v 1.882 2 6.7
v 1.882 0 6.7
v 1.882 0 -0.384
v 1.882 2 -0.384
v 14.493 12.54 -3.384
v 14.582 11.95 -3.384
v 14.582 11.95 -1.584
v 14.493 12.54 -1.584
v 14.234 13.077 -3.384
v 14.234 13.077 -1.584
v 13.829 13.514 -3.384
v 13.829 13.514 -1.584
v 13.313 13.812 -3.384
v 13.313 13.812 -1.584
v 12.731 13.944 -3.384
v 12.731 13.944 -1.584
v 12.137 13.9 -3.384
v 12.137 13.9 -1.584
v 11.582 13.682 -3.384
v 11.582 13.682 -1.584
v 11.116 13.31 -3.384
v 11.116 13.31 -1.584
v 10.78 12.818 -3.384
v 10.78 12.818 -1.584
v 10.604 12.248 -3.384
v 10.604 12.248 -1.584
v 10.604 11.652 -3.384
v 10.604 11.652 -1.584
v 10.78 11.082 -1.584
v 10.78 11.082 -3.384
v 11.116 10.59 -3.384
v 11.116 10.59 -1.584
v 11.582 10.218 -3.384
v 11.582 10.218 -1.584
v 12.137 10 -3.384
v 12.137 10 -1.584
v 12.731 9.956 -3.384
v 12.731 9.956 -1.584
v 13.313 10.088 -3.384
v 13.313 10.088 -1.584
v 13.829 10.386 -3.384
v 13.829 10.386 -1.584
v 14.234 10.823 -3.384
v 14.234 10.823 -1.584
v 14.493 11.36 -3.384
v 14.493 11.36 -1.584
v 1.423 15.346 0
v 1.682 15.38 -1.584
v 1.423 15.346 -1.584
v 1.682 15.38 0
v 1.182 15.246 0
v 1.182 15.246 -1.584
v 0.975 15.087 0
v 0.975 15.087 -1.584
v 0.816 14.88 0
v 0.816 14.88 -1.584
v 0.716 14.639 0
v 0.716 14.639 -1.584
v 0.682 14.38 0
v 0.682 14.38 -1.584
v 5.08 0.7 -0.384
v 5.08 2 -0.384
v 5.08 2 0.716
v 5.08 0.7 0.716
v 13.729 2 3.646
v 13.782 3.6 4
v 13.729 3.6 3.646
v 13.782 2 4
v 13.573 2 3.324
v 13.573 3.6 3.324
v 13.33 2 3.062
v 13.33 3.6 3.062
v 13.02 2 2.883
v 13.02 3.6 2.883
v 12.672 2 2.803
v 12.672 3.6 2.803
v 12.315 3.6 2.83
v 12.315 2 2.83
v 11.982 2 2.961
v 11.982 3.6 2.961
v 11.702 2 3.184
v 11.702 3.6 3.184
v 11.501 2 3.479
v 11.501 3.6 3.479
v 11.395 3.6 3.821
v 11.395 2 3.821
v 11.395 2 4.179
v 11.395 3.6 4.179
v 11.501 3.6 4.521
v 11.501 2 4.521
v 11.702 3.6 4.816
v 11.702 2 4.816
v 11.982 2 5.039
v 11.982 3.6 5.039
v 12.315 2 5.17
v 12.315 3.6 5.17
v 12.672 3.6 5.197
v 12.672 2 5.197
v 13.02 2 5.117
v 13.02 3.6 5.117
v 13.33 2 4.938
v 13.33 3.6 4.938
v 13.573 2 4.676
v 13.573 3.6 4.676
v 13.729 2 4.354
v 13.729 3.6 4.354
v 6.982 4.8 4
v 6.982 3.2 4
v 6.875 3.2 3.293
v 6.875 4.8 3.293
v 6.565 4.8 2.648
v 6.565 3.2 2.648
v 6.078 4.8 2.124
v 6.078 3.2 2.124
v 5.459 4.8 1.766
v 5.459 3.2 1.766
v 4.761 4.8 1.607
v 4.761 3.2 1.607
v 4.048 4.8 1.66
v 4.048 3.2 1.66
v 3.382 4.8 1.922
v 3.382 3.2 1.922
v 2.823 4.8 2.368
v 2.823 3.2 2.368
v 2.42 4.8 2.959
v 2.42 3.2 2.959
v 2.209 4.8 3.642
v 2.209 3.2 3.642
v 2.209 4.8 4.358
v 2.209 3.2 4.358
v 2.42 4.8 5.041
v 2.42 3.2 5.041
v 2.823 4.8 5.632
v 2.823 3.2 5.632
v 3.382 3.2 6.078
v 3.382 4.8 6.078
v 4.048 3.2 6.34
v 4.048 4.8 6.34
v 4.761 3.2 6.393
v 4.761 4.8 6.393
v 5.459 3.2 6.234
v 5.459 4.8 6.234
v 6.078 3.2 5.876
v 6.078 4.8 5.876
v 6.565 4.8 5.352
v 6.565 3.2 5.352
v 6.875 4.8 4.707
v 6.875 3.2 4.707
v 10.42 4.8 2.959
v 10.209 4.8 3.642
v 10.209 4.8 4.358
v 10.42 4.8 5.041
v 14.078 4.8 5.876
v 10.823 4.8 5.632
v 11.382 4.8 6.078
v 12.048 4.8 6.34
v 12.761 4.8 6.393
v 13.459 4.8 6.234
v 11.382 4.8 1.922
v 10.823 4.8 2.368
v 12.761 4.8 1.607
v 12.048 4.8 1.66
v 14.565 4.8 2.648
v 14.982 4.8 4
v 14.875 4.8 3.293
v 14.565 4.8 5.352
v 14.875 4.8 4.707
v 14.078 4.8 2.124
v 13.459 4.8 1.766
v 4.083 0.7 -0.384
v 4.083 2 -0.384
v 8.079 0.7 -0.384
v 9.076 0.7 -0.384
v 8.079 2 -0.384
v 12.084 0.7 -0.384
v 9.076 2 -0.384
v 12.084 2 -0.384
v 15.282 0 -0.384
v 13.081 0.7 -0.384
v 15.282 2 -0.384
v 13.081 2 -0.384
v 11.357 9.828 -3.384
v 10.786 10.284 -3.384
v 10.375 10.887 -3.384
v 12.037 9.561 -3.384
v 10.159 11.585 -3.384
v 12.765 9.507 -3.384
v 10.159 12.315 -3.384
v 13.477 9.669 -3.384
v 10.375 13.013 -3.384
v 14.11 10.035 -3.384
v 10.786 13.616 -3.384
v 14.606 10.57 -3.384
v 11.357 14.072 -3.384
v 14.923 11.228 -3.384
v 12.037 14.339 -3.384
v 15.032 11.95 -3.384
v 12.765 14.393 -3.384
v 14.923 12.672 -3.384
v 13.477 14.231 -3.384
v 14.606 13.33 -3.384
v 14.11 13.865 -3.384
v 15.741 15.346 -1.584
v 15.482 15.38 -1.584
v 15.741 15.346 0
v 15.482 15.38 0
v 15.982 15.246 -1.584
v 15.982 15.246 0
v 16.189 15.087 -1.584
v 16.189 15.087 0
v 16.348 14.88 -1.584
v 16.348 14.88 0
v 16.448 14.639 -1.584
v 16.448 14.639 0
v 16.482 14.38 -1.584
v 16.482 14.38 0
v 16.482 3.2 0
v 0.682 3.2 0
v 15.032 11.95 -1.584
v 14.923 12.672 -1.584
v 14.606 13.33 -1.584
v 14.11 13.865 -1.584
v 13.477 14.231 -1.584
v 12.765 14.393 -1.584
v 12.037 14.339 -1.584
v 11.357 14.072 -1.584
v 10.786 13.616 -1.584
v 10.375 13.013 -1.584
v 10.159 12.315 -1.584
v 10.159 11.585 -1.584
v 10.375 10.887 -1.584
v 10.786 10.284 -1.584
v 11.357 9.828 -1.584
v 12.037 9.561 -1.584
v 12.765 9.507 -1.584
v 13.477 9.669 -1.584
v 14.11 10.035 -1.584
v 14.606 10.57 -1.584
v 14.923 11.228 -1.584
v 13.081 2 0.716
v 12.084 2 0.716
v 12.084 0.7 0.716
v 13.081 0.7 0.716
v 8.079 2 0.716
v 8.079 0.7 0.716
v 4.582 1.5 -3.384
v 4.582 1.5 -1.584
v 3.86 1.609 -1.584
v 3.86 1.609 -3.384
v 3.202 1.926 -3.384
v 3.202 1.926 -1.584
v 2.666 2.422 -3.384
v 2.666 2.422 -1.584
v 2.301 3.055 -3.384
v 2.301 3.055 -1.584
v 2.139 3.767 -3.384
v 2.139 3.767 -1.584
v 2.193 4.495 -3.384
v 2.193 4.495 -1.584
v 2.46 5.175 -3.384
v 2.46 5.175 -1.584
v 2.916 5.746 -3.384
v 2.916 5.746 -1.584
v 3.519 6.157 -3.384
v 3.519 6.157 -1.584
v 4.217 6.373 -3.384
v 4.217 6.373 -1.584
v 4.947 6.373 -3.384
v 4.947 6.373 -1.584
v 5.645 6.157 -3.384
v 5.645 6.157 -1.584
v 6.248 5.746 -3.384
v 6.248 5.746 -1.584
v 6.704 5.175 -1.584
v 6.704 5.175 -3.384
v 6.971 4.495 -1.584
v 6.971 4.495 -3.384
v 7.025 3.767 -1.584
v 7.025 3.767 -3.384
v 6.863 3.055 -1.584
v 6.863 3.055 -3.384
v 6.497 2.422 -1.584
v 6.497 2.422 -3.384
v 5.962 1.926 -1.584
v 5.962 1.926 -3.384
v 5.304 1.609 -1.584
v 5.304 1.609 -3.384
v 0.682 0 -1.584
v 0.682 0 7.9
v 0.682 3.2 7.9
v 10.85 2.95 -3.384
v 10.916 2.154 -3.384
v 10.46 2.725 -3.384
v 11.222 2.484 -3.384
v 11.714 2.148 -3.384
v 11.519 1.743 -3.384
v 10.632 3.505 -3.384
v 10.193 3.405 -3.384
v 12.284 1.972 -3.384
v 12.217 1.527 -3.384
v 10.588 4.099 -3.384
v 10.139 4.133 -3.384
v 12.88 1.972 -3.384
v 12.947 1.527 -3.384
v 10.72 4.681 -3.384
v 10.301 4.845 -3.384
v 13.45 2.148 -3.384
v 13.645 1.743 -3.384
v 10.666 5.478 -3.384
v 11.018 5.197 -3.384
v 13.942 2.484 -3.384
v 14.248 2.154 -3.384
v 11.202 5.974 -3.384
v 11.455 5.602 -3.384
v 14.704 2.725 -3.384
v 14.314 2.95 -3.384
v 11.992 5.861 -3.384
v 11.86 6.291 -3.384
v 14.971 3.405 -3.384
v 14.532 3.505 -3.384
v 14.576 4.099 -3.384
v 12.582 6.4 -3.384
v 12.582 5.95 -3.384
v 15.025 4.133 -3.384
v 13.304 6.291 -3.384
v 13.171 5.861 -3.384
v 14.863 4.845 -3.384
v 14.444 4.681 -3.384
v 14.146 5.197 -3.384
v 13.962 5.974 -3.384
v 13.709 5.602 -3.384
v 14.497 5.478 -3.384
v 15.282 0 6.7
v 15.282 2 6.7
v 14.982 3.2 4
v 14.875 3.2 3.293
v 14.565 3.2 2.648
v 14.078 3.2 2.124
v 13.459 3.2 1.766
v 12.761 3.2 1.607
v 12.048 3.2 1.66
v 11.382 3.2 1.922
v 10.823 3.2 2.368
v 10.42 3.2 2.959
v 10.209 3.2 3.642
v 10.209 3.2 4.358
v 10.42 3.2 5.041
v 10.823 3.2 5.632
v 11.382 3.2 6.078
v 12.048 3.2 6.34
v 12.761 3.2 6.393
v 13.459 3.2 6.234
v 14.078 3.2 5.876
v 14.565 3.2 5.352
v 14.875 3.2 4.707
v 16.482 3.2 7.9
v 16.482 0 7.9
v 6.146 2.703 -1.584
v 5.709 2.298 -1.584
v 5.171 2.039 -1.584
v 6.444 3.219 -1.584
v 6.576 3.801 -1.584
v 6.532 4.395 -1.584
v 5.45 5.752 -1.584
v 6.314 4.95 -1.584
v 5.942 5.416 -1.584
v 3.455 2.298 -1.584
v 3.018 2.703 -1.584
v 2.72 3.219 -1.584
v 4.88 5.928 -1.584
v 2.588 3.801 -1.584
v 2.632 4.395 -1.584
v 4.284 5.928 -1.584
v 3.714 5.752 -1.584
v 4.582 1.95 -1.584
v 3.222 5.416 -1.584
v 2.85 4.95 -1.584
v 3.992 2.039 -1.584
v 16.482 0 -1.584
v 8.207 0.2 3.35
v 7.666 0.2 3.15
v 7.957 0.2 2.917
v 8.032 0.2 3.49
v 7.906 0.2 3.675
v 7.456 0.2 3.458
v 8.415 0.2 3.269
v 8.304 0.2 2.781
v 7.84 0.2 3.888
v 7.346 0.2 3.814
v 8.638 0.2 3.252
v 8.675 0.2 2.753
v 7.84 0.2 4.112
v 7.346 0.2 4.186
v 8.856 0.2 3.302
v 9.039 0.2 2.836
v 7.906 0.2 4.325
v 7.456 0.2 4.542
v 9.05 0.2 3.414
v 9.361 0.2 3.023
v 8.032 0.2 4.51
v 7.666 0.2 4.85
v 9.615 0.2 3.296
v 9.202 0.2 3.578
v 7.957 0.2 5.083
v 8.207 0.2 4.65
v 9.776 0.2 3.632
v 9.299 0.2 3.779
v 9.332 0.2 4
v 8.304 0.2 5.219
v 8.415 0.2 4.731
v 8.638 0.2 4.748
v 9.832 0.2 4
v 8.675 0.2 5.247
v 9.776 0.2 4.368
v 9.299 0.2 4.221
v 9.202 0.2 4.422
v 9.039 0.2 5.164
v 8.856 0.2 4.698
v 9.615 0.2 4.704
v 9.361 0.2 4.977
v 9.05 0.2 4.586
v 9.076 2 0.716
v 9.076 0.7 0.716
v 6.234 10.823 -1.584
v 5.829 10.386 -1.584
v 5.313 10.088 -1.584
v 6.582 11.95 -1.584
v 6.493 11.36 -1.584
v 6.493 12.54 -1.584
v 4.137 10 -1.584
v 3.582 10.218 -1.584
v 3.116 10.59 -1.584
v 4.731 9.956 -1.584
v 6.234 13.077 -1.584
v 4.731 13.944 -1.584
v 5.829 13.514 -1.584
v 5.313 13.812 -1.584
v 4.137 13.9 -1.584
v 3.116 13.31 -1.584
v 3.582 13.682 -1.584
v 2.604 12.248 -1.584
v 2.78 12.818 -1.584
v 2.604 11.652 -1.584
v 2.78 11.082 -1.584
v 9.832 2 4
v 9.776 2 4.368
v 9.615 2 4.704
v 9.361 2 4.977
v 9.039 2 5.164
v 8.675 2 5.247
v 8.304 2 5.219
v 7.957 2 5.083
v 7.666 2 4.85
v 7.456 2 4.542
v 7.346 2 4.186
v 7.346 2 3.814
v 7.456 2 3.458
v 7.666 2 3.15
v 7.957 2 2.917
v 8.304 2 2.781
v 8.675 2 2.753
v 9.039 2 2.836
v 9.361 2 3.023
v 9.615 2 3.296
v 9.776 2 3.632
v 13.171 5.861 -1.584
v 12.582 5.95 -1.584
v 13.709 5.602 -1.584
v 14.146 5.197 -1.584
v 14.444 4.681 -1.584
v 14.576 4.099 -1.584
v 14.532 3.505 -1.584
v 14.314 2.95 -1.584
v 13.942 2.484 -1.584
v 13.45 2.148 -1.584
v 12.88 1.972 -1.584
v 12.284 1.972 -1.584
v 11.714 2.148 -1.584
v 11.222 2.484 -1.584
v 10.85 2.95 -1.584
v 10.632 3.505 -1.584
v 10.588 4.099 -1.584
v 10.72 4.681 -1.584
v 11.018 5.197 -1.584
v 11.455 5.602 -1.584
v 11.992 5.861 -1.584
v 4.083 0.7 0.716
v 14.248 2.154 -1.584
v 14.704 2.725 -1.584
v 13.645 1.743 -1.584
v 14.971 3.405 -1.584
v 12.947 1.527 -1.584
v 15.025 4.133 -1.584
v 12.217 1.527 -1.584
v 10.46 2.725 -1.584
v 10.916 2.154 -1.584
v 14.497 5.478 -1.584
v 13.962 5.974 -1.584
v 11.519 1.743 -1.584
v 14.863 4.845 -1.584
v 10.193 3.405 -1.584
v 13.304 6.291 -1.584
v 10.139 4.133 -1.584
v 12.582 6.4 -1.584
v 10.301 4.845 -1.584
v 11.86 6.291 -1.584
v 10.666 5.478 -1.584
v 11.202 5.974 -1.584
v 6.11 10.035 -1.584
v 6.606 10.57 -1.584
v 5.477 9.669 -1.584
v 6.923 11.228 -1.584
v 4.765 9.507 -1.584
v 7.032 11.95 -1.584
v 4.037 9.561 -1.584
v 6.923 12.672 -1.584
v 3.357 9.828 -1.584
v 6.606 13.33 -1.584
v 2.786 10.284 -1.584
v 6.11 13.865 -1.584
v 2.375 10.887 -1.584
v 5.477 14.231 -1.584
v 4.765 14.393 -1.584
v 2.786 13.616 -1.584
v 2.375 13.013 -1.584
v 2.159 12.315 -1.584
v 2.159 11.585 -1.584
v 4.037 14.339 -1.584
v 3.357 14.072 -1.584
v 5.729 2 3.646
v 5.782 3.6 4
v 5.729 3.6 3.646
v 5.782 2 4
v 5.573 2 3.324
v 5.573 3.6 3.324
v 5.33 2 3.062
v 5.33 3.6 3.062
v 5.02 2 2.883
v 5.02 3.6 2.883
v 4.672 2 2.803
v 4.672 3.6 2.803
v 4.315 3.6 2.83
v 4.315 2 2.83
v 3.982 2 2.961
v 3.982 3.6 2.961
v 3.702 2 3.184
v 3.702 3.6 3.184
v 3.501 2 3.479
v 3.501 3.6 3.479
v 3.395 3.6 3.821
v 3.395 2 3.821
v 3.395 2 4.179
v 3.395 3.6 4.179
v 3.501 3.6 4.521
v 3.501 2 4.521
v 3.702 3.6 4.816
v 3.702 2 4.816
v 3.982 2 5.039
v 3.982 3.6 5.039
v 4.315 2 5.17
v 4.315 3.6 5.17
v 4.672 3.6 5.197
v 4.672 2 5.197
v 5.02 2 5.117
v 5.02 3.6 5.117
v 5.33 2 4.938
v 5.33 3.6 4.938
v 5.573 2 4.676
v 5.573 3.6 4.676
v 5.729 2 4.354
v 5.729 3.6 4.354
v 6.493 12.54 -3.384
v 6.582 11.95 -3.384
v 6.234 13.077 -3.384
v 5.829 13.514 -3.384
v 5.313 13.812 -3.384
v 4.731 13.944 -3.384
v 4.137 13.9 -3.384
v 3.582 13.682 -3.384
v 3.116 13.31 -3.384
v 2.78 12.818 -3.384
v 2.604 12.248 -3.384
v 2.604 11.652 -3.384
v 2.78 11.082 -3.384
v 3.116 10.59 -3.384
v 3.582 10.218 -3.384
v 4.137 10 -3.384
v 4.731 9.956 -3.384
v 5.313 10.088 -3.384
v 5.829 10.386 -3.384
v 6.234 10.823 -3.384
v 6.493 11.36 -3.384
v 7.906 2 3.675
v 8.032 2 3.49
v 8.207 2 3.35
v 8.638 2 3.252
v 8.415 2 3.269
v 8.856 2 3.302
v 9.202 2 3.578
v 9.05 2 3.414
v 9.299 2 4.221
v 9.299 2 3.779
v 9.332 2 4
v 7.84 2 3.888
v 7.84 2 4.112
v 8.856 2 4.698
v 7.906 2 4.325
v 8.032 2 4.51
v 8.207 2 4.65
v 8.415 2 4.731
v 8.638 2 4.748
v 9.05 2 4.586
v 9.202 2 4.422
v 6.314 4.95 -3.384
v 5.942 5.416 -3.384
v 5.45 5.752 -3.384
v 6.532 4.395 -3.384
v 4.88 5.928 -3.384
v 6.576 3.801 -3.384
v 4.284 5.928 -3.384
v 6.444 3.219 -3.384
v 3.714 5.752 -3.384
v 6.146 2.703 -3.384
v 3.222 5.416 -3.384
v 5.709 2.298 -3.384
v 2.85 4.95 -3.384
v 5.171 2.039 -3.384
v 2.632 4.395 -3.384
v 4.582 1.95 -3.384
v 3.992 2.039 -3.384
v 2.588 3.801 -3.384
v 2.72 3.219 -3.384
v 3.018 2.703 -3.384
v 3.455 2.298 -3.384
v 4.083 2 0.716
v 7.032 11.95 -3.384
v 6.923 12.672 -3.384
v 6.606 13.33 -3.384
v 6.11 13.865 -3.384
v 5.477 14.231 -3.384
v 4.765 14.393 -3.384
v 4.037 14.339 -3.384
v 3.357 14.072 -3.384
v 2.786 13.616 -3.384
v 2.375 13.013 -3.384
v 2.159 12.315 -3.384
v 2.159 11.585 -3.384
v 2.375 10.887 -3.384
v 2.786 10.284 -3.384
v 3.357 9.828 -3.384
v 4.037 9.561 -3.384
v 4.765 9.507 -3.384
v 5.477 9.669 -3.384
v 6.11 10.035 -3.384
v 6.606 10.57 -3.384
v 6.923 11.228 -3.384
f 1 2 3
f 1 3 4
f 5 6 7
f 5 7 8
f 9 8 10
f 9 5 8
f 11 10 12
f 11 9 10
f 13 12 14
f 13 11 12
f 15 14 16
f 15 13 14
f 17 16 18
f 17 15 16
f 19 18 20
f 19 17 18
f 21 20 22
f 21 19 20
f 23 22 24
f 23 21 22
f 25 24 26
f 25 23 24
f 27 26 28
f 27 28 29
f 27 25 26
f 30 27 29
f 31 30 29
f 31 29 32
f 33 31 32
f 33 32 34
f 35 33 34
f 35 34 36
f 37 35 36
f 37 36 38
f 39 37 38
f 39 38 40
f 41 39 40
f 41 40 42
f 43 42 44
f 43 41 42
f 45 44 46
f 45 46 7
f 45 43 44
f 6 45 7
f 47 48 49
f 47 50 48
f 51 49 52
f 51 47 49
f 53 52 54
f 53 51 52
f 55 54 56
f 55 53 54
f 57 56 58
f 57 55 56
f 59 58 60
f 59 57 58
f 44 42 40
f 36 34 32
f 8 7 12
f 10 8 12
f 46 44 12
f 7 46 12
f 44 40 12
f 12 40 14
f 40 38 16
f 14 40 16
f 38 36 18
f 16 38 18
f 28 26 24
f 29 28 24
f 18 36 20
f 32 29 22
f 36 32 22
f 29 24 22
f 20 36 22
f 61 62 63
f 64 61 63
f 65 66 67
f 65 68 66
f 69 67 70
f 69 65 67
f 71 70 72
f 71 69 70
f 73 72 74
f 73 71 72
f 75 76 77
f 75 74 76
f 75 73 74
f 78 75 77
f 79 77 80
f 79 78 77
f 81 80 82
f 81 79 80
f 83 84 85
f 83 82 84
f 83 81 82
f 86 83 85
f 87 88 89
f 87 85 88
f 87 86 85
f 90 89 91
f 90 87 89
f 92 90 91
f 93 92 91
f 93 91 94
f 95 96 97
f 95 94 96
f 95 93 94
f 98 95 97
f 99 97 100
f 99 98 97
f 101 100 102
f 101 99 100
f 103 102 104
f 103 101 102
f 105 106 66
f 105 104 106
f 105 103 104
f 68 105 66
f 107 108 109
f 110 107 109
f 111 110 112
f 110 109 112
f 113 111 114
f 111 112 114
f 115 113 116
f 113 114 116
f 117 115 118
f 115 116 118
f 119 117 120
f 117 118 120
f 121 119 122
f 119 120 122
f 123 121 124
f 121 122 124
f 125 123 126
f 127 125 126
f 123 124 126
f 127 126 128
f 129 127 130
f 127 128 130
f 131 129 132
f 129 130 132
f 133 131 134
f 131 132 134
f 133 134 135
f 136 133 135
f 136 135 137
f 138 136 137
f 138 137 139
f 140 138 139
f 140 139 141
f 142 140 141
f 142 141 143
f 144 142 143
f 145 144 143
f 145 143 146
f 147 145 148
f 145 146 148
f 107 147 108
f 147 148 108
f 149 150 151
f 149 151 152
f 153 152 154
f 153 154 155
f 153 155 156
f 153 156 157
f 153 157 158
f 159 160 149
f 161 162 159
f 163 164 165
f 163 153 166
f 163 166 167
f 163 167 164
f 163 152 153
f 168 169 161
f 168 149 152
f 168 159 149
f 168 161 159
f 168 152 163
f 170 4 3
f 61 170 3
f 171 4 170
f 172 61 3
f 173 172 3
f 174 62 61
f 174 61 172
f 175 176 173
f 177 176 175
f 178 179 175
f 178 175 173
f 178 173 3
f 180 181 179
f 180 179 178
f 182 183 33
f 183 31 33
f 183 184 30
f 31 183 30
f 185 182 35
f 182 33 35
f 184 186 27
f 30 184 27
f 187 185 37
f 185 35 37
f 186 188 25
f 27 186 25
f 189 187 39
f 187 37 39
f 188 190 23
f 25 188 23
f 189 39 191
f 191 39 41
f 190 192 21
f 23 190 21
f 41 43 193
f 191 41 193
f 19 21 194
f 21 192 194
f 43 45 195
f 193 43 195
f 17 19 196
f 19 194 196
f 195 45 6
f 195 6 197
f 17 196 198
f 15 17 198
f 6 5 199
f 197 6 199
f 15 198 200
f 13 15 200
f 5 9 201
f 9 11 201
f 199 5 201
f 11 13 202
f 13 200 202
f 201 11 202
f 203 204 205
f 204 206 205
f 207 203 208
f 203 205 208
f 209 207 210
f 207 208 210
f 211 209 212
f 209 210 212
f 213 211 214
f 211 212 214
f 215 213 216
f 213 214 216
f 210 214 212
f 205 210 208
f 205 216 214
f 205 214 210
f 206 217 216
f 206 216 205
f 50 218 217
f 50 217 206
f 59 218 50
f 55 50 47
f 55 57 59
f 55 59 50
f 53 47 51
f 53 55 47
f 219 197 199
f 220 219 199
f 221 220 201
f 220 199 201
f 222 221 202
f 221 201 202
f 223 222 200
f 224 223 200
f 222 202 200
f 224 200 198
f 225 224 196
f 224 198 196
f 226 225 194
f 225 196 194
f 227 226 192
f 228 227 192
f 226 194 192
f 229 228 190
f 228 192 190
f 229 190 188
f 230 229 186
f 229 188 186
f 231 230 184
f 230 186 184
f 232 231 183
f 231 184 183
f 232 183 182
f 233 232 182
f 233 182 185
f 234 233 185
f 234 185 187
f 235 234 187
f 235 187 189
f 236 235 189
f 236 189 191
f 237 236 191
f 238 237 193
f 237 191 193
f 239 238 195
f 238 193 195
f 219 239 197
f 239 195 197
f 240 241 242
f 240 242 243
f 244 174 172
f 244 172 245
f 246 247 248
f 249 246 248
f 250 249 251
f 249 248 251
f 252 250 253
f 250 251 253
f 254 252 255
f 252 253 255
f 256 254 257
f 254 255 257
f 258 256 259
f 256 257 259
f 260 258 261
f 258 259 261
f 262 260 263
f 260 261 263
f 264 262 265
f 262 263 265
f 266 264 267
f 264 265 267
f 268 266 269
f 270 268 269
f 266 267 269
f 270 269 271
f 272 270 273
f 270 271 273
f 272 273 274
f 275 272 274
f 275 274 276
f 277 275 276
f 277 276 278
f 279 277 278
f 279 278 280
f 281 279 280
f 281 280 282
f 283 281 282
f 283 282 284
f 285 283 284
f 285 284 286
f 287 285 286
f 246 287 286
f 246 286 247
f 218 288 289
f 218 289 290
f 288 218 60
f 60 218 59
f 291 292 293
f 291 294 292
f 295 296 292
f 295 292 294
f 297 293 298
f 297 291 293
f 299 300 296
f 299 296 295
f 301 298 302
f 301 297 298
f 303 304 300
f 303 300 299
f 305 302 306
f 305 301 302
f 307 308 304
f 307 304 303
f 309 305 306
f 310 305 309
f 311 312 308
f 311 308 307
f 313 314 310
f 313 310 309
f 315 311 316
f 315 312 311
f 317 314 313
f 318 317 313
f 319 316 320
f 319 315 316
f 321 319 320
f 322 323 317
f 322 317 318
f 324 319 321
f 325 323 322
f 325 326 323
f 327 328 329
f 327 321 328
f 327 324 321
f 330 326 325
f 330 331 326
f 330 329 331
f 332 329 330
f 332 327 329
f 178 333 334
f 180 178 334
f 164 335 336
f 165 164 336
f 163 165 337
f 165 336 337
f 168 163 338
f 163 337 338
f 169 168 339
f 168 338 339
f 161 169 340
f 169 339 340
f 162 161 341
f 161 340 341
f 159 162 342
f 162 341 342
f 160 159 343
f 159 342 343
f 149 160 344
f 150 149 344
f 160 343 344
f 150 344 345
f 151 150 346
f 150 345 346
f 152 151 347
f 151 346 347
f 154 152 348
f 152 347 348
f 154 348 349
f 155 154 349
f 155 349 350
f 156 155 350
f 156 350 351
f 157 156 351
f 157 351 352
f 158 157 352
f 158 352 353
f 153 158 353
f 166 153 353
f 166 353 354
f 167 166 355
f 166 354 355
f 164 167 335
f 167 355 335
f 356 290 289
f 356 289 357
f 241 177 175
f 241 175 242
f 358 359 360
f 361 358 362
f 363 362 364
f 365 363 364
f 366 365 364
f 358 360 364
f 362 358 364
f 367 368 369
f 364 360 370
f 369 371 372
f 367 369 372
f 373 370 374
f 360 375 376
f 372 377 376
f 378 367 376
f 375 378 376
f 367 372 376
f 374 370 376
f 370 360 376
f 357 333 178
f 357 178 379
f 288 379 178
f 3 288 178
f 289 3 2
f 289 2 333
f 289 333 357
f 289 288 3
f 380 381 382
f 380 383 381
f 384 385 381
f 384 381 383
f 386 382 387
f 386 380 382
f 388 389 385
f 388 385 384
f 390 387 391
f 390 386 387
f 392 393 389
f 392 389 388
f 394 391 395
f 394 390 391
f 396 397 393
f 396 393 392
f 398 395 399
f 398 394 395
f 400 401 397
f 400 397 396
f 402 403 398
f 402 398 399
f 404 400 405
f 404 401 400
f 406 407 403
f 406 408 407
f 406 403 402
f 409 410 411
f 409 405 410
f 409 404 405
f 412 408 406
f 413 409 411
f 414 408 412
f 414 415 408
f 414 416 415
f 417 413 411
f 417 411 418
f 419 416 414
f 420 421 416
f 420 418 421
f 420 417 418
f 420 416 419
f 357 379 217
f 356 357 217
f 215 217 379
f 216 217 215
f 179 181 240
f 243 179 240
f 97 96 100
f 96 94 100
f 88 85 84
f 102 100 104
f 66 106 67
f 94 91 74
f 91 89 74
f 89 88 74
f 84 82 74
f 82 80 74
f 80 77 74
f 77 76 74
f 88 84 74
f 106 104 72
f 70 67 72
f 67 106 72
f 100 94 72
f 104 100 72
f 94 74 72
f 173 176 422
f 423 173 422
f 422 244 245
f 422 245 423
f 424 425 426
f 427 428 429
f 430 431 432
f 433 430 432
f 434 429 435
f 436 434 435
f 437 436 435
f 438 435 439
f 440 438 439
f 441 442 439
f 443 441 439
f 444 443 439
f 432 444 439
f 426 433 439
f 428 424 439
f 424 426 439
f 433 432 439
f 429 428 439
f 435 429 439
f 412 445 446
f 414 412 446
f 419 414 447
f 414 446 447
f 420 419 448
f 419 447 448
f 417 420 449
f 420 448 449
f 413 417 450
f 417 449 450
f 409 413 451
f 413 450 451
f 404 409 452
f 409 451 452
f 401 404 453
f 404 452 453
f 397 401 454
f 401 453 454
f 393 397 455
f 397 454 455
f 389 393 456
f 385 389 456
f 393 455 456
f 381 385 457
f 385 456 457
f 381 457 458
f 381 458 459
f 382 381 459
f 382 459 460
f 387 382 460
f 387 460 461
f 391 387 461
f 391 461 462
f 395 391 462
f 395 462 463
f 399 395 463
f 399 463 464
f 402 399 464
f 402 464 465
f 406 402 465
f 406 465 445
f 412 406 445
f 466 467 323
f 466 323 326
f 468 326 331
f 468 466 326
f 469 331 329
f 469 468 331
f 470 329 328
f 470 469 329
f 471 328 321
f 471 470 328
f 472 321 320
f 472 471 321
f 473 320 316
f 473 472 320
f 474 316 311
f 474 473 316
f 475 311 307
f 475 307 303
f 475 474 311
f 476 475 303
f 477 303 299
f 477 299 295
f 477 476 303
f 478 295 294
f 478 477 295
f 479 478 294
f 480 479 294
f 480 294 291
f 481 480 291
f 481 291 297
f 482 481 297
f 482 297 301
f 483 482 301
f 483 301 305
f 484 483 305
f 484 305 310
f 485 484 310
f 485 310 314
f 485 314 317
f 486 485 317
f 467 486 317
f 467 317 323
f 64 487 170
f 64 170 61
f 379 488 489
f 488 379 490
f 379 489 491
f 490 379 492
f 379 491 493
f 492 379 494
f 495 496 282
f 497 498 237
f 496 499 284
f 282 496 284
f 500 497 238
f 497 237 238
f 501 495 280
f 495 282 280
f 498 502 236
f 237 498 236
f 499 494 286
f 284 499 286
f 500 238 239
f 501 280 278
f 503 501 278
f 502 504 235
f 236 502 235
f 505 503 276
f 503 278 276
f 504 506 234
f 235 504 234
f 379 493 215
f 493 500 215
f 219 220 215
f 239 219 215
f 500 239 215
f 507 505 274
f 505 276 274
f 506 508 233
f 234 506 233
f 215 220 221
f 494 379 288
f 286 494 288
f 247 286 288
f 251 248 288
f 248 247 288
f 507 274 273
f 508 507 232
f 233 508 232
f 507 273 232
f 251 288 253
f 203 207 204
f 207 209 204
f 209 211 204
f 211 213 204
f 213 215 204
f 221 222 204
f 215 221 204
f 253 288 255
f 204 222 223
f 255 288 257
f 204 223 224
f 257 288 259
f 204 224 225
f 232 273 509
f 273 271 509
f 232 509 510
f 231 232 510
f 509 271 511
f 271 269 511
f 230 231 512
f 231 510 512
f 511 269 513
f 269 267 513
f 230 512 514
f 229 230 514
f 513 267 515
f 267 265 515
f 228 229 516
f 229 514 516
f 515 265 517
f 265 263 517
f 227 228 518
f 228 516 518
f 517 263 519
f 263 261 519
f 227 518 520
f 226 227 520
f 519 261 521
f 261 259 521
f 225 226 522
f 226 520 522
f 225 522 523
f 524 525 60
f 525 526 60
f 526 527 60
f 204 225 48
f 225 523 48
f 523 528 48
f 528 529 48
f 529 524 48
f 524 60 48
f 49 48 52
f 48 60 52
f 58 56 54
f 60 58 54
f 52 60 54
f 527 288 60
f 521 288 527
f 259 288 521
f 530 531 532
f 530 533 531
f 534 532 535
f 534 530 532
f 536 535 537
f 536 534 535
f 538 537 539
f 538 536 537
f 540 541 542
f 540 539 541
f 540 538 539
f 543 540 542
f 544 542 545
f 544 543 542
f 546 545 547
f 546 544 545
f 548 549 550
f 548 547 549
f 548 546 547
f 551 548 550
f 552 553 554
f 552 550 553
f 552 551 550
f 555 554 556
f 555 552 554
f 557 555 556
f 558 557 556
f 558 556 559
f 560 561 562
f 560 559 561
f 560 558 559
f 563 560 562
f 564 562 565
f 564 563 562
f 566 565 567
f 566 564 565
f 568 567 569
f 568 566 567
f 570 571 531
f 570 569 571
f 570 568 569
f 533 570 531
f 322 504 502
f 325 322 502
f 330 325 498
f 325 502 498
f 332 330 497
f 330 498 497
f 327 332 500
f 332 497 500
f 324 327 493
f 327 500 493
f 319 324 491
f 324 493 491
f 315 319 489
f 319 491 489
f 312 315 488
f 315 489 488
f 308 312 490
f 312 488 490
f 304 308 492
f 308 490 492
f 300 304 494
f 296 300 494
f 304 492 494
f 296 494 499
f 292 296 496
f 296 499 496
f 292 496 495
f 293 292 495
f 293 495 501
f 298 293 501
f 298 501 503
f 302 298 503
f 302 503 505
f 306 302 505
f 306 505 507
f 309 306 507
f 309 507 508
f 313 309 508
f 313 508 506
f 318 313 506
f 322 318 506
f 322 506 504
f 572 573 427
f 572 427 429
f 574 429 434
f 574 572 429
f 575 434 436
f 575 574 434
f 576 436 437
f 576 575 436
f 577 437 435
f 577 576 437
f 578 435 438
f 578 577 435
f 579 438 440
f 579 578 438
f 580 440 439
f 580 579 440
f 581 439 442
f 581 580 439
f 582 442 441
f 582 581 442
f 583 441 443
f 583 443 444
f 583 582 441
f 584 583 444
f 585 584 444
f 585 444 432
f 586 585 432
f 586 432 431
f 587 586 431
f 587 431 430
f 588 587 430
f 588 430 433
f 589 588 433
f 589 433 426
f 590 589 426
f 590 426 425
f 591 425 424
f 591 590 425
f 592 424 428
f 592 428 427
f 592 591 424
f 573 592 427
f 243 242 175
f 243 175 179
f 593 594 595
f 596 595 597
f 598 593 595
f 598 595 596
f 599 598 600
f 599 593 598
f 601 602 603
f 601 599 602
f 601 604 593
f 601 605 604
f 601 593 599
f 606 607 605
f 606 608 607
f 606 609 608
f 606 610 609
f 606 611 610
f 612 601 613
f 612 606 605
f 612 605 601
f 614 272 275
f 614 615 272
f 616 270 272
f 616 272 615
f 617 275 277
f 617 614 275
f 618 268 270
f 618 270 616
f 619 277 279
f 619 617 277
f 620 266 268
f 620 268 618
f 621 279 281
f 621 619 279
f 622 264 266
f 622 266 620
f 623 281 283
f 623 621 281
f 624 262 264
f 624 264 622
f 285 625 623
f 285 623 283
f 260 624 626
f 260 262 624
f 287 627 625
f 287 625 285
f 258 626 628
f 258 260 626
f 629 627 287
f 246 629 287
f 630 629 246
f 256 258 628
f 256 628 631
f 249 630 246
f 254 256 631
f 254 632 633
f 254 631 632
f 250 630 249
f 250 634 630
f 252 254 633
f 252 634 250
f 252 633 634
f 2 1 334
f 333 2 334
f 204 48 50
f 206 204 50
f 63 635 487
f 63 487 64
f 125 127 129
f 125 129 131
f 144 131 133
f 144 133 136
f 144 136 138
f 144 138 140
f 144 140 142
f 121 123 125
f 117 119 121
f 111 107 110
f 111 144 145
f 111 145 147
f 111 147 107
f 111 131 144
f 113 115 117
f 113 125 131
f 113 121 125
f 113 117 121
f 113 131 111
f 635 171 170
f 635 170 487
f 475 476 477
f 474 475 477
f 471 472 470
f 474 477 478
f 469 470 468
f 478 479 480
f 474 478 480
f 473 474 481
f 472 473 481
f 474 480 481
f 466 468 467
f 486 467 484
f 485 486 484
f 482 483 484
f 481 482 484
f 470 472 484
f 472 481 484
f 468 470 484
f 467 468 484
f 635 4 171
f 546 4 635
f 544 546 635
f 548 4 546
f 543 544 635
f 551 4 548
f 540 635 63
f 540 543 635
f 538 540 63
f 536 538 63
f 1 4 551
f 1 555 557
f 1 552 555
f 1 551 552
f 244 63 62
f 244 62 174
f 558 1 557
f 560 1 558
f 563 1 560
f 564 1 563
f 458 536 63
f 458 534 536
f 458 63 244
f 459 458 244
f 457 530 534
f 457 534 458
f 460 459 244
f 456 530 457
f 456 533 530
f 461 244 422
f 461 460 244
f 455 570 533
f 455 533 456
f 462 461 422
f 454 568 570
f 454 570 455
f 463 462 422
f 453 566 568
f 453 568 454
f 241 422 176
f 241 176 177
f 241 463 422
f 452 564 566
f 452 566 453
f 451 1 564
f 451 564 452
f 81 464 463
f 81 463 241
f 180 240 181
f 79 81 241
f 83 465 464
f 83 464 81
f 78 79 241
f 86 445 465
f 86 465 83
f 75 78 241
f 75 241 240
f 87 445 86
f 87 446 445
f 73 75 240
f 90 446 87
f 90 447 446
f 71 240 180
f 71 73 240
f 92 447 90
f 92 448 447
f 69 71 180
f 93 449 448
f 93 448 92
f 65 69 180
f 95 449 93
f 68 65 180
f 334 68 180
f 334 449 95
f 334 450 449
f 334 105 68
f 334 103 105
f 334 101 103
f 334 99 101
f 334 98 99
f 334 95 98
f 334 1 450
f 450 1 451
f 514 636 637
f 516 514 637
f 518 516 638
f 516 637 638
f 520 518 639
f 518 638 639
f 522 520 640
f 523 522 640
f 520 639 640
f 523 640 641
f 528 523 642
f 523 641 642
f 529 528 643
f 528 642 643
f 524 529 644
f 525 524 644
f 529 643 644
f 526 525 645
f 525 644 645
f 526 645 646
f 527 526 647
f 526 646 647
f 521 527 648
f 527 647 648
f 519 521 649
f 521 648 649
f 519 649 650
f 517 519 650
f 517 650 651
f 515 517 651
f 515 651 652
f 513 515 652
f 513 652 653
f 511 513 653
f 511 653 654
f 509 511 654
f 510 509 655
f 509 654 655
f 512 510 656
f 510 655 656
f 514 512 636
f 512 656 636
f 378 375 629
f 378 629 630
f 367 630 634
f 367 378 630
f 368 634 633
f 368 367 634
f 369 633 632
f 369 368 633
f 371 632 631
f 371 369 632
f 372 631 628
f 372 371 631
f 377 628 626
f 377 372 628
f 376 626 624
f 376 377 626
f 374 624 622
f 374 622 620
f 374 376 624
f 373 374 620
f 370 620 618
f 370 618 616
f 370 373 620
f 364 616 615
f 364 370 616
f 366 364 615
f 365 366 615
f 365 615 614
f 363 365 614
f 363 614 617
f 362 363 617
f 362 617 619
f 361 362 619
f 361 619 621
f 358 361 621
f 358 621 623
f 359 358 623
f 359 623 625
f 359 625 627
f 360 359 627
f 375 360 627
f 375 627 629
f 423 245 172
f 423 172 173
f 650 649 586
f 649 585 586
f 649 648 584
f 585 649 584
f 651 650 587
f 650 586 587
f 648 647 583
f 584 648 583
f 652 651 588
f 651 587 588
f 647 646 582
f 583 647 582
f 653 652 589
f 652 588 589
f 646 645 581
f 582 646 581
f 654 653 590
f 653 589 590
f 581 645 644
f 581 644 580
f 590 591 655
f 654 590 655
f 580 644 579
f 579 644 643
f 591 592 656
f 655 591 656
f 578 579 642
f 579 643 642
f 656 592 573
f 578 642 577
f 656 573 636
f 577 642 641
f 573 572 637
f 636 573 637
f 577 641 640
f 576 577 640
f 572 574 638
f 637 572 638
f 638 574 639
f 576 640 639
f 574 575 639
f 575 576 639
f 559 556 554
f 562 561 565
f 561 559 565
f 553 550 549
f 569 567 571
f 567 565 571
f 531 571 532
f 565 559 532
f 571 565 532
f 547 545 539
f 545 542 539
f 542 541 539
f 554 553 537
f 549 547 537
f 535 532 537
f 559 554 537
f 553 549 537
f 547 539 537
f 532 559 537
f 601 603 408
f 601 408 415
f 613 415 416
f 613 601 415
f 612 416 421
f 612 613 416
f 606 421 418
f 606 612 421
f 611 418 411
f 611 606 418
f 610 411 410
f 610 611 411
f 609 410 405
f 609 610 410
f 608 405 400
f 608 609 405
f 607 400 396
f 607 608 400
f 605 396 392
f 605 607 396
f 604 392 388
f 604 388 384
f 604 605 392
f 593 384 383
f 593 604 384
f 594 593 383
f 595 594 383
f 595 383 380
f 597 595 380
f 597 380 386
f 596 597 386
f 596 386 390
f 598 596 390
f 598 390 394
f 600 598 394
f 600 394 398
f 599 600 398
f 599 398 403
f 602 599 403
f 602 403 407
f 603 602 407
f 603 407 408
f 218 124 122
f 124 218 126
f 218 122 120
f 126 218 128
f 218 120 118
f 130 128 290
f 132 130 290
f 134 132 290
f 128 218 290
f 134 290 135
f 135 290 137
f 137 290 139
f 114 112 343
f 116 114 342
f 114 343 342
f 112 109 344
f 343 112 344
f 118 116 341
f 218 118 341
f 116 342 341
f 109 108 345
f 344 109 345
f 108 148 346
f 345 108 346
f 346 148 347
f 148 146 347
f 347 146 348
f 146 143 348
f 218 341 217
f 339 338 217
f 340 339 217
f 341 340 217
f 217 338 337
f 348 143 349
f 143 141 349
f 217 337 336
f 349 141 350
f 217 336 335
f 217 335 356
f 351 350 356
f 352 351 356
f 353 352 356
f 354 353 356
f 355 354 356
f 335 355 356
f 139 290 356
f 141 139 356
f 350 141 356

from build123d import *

# Parameters (mm, degrees)
MAINBASESKETCH_W                       = 15.8
MAINBASESKETCH_H                       = 3.2
MAINBASEEXTRUDE_DEPTH                  = 7.9
STUDSSKETCH_R                          = 2.4
STUDSEXTRUDE_DEPTH                     = 1.6
STUDSPATTERN_COUNT                     = 2
STUDSPATTERN_PITCH                     = 8
STUDSPATTERN_COUNT_DIR2                = 2
STUDSPATTERN_PITCH_DIR2                = 8
MAINBASESHELL_T                        = -1.2
LCUTBLUE_DEPTH                         = 19.555463972
LCUTBLUE_DEPTH_BACK                    = 19.555463972
CUTADDEDTOLCUT_DEPTH                   = 2
MADESLIMCUTSKETCH_W                    = 7.9
MADESLIMCUTSKETCH_H                    = 7.9
MADESLIMCUT_DEPTH                      = 19.897228453
MADESLIMFILLEXT_REACH                  = 20.897
SKETCH33_W                             = 5.500952983
SKETCH33_H                             = 1.199047018
SLIMHOLEEXT_START                      = -0.2
SLIMHOLESKETCH_R                       = 1.25
SLIMHOLESKETCH_R_2                     = 0.75
SLIMHOLEEXT_DEPTH                      = 2
ANGLEDSLIMBASESWEEP_START              = 0.681967213
ANGLEDSLIMBASESWEEP_OUTLINE_W          = 7.9
ANGLEDSLIMBASESWEEP_OUTLINE_H          = 1.583745828
ANGLEDSLIMBASESWEEP_DEPTH              = 15.8
SHORTLEXTENDEDCUT_START                = -2
SHORTLEXTENDEDCUTSKETCH_W              = 13.4
SHORTLEXTENDEDCUTSKETCH_H              = 1.582792846
SHORTLEXTENDEDCUT_DEPTH                = 2
SHORTLUNDERSTUMPS_START                = -0.2
SHORTLUNDERSTUMPSKETCH_W               = 0.996828098
SHORTLUNDERSTUMPSKETCH_H               = 1.1
SHORTLUNDERSTUMPS_DEPTH                = 1.5
SHORTLUPPERCIRCLES_START               = -0.2
SHORTLUPPERCIRCLESSKETCH_R             = 2.45
SHORTLUPPERCIRCLESSKETCH_R_2           = 2
SHORTLUPPERCIRCLES_DEPTH               = 2
HOLESBASEHOLESHORT_START               = 0.681967213
HOLESBASEHOLESHORT_OUTLINE_W           = 7.48
HOLESBASEHOLESHORT_OUTLINE_H           = 1.583745828
HOLESBASEHOLESHORT_DEPTH               = 15.8
F_4UPPERCIRCLESTALLERLBASE_START       = -3.383745828
F_4UPPERCIRCLESTALLERLBASE_OUTLINE_R   = 2.45
F_4UPPERCIRCLESTALLERLBASE_OUTLINE_R_2 = 2
F_4UPPERCIRCLESTALLERLBASE_DEPTH       = 1.8
TALLERLBASEOUTERCHAMFER_R              = 1


# Read off the part's stored shape, not the designer's step: AngledSlimBaseSweep, HolesBaseHoleShort, 4UpperCirclesTallerLBase
with BuildPart() as part:
    # MainBaseSketch → MainBaseExtrude (new, symmetric)
    with BuildSketch(Plane.XY):
        with Locations((8.581967213, 1.6)):
            Rectangle(MAINBASESKETCH_W, MAINBASESKETCH_H)
    extrude(amount=MAINBASEEXTRUDE_DEPTH, both=True)

    # StudsSketch → StudsExtrude (add)
    with BuildSketch(Plane(origin=(0, 3.2, 0), x_dir=(1, 0, 0), z_dir=(0, 1, 0))):
        with Locations((4.581967213, 4)):
            Circle(STUDSSKETCH_R)
    studsextrude = extrude(amount=STUDSEXTRUDE_DEPTH)

    # StudsPattern: StudsExtrude 2 × 2
    with Locations(*[(j * STUDSPATTERN_PITCH_DIR2, 0, i * STUDSPATTERN_PITCH) for i in range(STUDSPATTERN_COUNT) for j in range(STUDSPATTERN_COUNT_DIR2) if (i, j) != (0, 0)]):
        add(studsextrude)

    # MainBaseShell
    mainbaseshell_openings = [part.faces().sort_by_distance(p)[0] for p in [
        (8.581967213, 0, 0),
    ]]
    offset(amount=MAINBASESHELL_T, openings=mainbaseshell_openings, kind=Kind.INTERSECTION)

    # LCUTBlueSketch → LCutBlue (cut, two sides: drawn at the far end of the back side and taken through both)
    with BuildSketch(Plane(origin=(0, 3.2, 0), x_dir=(1, 0, 0), z_dir=(0, 1, 0)).offset(-LCUTBLUE_DEPTH_BACK)):
        Polygon((8.581967213, 53.229874044), (8.581967213, 7.9), (8.581967213, 0), (16.481967213, 0), (61.811841258, 0), (125.917963912, 64.106122654), (72.688089868, 117.335996699), align=None)
    extrude(amount=LCUTBLUE_DEPTH + LCUTBLUE_DEPTH_BACK, mode=Mode.SUBTRACT)

    # CutAddedtoLSketch → CutAddedToLCut (add)
    with BuildSketch(Plane.XZ):
        Polygon((7.382920196, -6.7), (8.581967213, -6.7), (8.581967213, 0), (15.281967213, 0), (15.281967213, 1.199047018), (7.382920196, 1.199047018), (7.382920196, 0), align=None)
    extrude(amount=-CUTADDEDTOLCUT_DEPTH)

    # MadeSlimCutSketch → MadeSlimCut (cut, through all)
    with BuildSketch(Plane.XZ):
        with Locations((4.631967213, -3.95)):
            Rectangle(MADESLIMCUTSKETCH_W, MADESLIMCUTSKETCH_H)
    extrude(amount=-MADESLIMCUT_DEPTH, mode=Mode.SUBTRACT)

    # Sketch33 → MadeSlimFillExt (add, up to next)
    with BuildSketch(Plane.XZ, mode=Mode.PRIVATE) as madeslimfillext_sk1:
        with Locations((4.632443704, 0.599523509)):
            Rectangle(SKETCH33_W, SKETCH33_H)
    madeslimfillext_tool1 = extrude(madeslimfillext_sk1.sketch, amount=-MADESLIMFILLEXT_REACH, mode=Mode.PRIVATE) - part.part
    add(madeslimfillext_tool1.solids().sort_by_distance((4.632444, 0, 0.599524))[0])

    # SlimHoleSketch → SlimHoleExt (add)
    with BuildSketch(Plane.XZ.offset(-2).offset(SLIMHOLEEXT_START)):
        with Locations((8.581967213, 4)):
            Circle(SLIMHOLESKETCH_R)
        with Locations((8.581967213, 4)):
            Circle(SLIMHOLESKETCH_R_2, mode=Mode.SUBTRACT)
    extrude(amount=SLIMHOLEEXT_DEPTH)

    # AngledSlimBaseSweep outline → AngledSlimBaseSweep (add)
    with BuildSketch(Plane.YZ.offset(ANGLEDSLIMBASESWEEP_START)):
        with Locations((3.95, -0.791872914)):
            Rectangle(ANGLEDSLIMBASESWEEP_OUTLINE_W, ANGLEDSLIMBASESWEEP_OUTLINE_H)
    extrude(amount=ANGLEDSLIMBASESWEEP_DEPTH)

    # ShortLExtendedCutSketch → ShortLExtendedCut (cut)
    with BuildSketch(Plane.XZ.offset(SHORTLEXTENDEDCUT_START)):
        with Locations((8.581967213, 0.407650595)):
            Rectangle(SHORTLEXTENDEDCUTSKETCH_W, SHORTLEXTENDEDCUTSKETCH_H)
    extrude(amount=SHORTLEXTENDEDCUT_DEPTH, mode=Mode.SUBTRACT)

    # ShortLUnderStumpSketch → ShortLUnderStumps (add)
    with BuildSketch(Plane.XZ.offset(-2).offset(SHORTLUNDERSTUMPS_START)):
        with Locations((4.581764801, 0.166254172)):
            Rectangle(SHORTLUNDERSTUMPSKETCH_W, SHORTLUNDERSTUMPSKETCH_H)
        with Locations((8.57767054, 0.166254172)):
            Rectangle(SHORTLUNDERSTUMPSKETCH_W, SHORTLUNDERSTUMPSKETCH_H)
        with Locations((12.582169625, 0.166254172)):
            Rectangle(SHORTLUNDERSTUMPSKETCH_W, SHORTLUNDERSTUMPSKETCH_H)
    extrude(amount=SHORTLUNDERSTUMPS_DEPTH)

    # ShortLUpperCirclesSketch → ShortLUpperCircles (add)
    # profile 1 of 2: a face of its own
    with BuildSketch(Plane(origin=(0, 0, -1.583745828), x_dir=(-1, 0, 0), z_dir=(0, 0, -1)).offset(SHORTLUPPERCIRCLES_START)):
        with Locations(Location((-12.581967213, 3.95, 0), (0, 0, 90))):
            Circle(SHORTLUPPERCIRCLESSKETCH_R)
        with Locations(Location((-12.581967213, 3.95, 0), (0, 0, 90))):
            Circle(SHORTLUPPERCIRCLESSKETCH_R_2, mode=Mode.SUBTRACT)
    # profile 2 of 2: a face of its own
    with BuildSketch(Plane(origin=(0, 0, -1.583745828), x_dir=(-1, 0, 0), z_dir=(0, 0, -1)).offset(SHORTLUPPERCIRCLES_START)):
        with Locations(Location((-4.581967213, 3.95, 0), (0, 0, 270))):
            Circle(SHORTLUPPERCIRCLESSKETCH_R)
        with Locations(Location((-4.581967213, 3.95, 0), (0, 0, 270))):
            Circle(SHORTLUPPERCIRCLESSKETCH_R_2, mode=Mode.SUBTRACT)
    extrude(amount=SHORTLUPPERCIRCLES_DEPTH)

    # HolesBaseHoleShort outline → HolesBaseHoleShort (add)
    with BuildSketch(Plane.YZ.offset(HOLESBASEHOLESHORT_START)):
        with Locations((11.64, -0.791872914)):
            Rectangle(HOLESBASEHOLESHORT_OUTLINE_W, HOLESBASEHOLESHORT_OUTLINE_H)
    extrude(amount=HOLESBASEHOLESHORT_DEPTH)

    # 4UpperCirclesTallerLBase outline → 4UpperCirclesTallerLBase (add)
    # profile 1 of 2: a face of its own
    with BuildSketch(Plane.XY.offset(F_4UPPERCIRCLESTALLERLBASE_START)):
        with Locations((4.581967213, 11.95)):
            Circle(F_4UPPERCIRCLESTALLERLBASE_OUTLINE_R)
        with Locations((4.581967213, 11.95)):
            Circle(F_4UPPERCIRCLESTALLERLBASE_OUTLINE_R_2, mode=Mode.SUBTRACT)
    # profile 2 of 2: a face of its own
    with BuildSketch(Plane.XY.offset(F_4UPPERCIRCLESTALLERLBASE_START)):
        with Locations((12.581967213, 11.95)):
            Circle(F_4UPPERCIRCLESTALLERLBASE_OUTLINE_R)
        with Locations((12.581967213, 11.95)):
            Circle(F_4UPPERCIRCLESTALLERLBASE_OUTLINE_R_2, mode=Mode.SUBTRACT)
    extrude(amount=F_4UPPERCIRCLESTALLERLBASE_DEPTH)

    # TallerLBaseOuterChamfer
    tallerlbaseouterchamfer_edges = [part.edges().sort_by_distance(p)[0] for p in [
        (16.481967213, 15.38, -0.791872914),
        (0.681967213, 15.38, -0.791872914),
    ]]
    fillet(tallerlbaseouterchamfer_edges, radius=TALLERLBASEOUTERCHAMFER_R)


solid = part.part
